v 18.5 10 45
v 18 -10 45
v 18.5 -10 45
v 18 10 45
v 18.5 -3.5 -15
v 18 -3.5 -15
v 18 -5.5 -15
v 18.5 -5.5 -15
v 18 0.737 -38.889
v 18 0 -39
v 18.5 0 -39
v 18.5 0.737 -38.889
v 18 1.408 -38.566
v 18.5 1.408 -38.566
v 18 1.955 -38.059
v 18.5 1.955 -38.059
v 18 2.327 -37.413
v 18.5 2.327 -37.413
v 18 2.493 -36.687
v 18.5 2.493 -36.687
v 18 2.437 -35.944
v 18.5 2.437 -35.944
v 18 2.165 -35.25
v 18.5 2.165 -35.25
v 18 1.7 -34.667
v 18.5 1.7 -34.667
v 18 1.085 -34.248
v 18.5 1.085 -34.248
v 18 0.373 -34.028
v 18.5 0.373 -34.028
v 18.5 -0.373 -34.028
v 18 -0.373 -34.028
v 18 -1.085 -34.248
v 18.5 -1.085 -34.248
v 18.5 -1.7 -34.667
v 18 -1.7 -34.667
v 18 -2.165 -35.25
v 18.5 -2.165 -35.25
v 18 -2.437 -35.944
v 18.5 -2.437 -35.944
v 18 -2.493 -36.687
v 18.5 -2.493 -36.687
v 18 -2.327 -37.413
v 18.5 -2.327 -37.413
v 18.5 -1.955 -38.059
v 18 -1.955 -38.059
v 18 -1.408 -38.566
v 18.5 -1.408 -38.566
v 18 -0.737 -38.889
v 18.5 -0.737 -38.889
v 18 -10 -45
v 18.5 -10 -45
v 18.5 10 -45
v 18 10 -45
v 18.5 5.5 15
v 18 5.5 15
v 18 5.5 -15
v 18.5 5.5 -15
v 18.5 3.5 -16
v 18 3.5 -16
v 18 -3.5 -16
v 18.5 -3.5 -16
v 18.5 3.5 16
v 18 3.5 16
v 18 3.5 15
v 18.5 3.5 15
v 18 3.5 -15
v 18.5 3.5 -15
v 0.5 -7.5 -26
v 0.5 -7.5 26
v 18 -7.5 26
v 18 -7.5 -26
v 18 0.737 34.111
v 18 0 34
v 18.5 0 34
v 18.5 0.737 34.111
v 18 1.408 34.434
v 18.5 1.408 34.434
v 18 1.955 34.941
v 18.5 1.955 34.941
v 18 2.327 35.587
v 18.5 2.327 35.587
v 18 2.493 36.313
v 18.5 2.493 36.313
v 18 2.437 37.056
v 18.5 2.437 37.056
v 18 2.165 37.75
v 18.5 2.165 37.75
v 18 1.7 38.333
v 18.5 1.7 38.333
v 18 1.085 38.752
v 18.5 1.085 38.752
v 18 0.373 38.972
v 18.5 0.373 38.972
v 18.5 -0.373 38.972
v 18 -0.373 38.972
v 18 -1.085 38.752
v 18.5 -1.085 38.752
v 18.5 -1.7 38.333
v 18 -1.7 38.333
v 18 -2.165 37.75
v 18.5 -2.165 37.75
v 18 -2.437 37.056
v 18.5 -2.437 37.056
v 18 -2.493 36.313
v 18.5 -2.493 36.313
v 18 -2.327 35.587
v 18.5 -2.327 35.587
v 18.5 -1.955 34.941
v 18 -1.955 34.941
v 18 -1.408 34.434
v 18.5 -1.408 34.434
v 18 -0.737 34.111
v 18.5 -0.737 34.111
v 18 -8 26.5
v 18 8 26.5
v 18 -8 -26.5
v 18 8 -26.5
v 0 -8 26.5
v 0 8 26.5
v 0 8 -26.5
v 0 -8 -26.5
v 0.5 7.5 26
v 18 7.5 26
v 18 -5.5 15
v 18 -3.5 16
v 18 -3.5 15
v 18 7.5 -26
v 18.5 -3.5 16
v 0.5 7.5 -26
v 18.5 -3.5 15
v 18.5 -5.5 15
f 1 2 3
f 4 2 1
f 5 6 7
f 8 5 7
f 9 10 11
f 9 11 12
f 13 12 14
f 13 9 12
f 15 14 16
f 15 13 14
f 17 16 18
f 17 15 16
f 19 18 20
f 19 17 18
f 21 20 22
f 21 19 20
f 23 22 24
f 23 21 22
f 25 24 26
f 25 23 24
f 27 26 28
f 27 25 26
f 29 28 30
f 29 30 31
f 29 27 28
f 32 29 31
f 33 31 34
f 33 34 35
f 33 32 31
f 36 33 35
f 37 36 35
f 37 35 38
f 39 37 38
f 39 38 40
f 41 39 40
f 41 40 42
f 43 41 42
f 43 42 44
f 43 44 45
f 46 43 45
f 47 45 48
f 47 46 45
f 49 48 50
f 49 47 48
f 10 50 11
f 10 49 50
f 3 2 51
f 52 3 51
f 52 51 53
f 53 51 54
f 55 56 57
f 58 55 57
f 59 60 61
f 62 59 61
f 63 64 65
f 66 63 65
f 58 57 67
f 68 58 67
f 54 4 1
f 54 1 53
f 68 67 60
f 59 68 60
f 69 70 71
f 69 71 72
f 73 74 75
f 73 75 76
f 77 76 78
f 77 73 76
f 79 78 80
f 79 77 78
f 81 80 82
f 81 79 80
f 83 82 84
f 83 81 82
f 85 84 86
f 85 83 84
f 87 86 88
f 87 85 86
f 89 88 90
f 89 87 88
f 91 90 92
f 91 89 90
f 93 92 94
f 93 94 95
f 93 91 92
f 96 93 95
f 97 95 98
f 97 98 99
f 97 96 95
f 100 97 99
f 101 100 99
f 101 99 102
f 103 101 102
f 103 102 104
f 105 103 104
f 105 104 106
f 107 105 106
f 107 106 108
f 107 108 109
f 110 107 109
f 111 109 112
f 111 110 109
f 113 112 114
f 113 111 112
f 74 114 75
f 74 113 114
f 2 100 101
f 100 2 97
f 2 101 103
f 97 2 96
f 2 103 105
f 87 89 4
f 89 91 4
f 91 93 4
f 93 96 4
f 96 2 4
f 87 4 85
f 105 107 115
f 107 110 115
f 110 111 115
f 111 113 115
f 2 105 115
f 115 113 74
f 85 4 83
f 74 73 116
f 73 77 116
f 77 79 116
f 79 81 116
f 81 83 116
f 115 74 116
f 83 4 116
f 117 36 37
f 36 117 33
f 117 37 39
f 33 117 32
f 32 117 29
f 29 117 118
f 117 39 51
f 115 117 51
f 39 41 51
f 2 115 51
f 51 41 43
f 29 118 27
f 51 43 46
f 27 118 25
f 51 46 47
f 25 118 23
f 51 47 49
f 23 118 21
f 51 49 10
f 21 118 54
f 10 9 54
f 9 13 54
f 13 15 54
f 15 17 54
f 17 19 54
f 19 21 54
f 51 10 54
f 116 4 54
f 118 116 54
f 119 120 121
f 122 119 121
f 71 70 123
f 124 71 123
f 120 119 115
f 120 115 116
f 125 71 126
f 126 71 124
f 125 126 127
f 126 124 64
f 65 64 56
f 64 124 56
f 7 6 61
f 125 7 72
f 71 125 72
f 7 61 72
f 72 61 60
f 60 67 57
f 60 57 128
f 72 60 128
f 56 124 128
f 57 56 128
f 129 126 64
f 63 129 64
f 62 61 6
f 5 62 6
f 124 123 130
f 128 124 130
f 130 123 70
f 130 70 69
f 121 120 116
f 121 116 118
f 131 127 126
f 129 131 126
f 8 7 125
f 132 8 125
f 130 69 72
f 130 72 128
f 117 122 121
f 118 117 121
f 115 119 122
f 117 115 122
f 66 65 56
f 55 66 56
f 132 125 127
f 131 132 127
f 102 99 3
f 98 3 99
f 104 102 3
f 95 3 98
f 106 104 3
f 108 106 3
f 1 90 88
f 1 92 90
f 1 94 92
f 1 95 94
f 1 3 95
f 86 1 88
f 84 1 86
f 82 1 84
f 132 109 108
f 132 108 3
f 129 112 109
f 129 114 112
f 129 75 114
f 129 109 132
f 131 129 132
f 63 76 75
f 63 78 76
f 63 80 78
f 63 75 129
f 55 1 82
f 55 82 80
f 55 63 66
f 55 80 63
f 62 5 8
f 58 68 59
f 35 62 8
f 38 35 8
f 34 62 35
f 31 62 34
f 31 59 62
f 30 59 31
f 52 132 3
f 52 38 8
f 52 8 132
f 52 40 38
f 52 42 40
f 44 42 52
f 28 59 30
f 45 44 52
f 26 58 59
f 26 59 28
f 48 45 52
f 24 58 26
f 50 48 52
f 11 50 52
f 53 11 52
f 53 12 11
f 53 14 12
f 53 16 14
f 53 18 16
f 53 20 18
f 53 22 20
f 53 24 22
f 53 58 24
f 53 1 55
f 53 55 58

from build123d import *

# Parameters (mm, degrees)
SKETCH1_W           = 53
SKETCH1_H           = 16
BOSS_EXTRUDE1_DEPTH = 18
SHELL1_T            = -0.5
SKETCH2_W           = 90
SKETCH2_H           = 20
SKETCH2_R           = 2.5
BOSS_EXTRUDE2_DEPTH = 0.5


with BuildPart() as part:
    # Sketch1 → Boss-Extrude1 (new body)
    with BuildSketch(Plane(origin=(0, 0, 0), x_dir=(0, 0, -1), z_dir=(1, 0, 0))):
        Rectangle(SKETCH1_W, SKETCH1_H)
    extrude(amount=BOSS_EXTRUDE1_DEPTH)

    # Shell1
    shell1_openings = [part.faces().sort_by_distance(p)[0] for p in [
        (18, 0, 0),
    ]]
    offset(amount=SHELL1_T, openings=shell1_openings, kind=Kind.INTERSECTION)

    # Sketch2 → Boss-Extrude2 (add)
    with BuildSketch(Plane(origin=(18, 0, 0), x_dir=(0, 0, -1), z_dir=(1, 0, 0))):
        Rectangle(SKETCH2_W, SKETCH2_H)
        with Locations((36.5, 0)):
            Circle(SKETCH2_R, mode=Mode.SUBTRACT)
        with Locations((-36.5, 0)):
            Circle(SKETCH2_R, mode=Mode.SUBTRACT)
        Polygon((-16, 3.5), (-15, 3.5), (-15, 5.5), (15, 5.5), (15, 3.5), (16, 3.5), (16, -3.5), (15, -3.5), (15, -5.5), (-15, -5.5), (-15, -3.5), (-16, -3.5), align=None, mode=Mode.SUBTRACT)
    extrude(amount=BOSS_EXTRUDE2_DEPTH)


solid = part.part
